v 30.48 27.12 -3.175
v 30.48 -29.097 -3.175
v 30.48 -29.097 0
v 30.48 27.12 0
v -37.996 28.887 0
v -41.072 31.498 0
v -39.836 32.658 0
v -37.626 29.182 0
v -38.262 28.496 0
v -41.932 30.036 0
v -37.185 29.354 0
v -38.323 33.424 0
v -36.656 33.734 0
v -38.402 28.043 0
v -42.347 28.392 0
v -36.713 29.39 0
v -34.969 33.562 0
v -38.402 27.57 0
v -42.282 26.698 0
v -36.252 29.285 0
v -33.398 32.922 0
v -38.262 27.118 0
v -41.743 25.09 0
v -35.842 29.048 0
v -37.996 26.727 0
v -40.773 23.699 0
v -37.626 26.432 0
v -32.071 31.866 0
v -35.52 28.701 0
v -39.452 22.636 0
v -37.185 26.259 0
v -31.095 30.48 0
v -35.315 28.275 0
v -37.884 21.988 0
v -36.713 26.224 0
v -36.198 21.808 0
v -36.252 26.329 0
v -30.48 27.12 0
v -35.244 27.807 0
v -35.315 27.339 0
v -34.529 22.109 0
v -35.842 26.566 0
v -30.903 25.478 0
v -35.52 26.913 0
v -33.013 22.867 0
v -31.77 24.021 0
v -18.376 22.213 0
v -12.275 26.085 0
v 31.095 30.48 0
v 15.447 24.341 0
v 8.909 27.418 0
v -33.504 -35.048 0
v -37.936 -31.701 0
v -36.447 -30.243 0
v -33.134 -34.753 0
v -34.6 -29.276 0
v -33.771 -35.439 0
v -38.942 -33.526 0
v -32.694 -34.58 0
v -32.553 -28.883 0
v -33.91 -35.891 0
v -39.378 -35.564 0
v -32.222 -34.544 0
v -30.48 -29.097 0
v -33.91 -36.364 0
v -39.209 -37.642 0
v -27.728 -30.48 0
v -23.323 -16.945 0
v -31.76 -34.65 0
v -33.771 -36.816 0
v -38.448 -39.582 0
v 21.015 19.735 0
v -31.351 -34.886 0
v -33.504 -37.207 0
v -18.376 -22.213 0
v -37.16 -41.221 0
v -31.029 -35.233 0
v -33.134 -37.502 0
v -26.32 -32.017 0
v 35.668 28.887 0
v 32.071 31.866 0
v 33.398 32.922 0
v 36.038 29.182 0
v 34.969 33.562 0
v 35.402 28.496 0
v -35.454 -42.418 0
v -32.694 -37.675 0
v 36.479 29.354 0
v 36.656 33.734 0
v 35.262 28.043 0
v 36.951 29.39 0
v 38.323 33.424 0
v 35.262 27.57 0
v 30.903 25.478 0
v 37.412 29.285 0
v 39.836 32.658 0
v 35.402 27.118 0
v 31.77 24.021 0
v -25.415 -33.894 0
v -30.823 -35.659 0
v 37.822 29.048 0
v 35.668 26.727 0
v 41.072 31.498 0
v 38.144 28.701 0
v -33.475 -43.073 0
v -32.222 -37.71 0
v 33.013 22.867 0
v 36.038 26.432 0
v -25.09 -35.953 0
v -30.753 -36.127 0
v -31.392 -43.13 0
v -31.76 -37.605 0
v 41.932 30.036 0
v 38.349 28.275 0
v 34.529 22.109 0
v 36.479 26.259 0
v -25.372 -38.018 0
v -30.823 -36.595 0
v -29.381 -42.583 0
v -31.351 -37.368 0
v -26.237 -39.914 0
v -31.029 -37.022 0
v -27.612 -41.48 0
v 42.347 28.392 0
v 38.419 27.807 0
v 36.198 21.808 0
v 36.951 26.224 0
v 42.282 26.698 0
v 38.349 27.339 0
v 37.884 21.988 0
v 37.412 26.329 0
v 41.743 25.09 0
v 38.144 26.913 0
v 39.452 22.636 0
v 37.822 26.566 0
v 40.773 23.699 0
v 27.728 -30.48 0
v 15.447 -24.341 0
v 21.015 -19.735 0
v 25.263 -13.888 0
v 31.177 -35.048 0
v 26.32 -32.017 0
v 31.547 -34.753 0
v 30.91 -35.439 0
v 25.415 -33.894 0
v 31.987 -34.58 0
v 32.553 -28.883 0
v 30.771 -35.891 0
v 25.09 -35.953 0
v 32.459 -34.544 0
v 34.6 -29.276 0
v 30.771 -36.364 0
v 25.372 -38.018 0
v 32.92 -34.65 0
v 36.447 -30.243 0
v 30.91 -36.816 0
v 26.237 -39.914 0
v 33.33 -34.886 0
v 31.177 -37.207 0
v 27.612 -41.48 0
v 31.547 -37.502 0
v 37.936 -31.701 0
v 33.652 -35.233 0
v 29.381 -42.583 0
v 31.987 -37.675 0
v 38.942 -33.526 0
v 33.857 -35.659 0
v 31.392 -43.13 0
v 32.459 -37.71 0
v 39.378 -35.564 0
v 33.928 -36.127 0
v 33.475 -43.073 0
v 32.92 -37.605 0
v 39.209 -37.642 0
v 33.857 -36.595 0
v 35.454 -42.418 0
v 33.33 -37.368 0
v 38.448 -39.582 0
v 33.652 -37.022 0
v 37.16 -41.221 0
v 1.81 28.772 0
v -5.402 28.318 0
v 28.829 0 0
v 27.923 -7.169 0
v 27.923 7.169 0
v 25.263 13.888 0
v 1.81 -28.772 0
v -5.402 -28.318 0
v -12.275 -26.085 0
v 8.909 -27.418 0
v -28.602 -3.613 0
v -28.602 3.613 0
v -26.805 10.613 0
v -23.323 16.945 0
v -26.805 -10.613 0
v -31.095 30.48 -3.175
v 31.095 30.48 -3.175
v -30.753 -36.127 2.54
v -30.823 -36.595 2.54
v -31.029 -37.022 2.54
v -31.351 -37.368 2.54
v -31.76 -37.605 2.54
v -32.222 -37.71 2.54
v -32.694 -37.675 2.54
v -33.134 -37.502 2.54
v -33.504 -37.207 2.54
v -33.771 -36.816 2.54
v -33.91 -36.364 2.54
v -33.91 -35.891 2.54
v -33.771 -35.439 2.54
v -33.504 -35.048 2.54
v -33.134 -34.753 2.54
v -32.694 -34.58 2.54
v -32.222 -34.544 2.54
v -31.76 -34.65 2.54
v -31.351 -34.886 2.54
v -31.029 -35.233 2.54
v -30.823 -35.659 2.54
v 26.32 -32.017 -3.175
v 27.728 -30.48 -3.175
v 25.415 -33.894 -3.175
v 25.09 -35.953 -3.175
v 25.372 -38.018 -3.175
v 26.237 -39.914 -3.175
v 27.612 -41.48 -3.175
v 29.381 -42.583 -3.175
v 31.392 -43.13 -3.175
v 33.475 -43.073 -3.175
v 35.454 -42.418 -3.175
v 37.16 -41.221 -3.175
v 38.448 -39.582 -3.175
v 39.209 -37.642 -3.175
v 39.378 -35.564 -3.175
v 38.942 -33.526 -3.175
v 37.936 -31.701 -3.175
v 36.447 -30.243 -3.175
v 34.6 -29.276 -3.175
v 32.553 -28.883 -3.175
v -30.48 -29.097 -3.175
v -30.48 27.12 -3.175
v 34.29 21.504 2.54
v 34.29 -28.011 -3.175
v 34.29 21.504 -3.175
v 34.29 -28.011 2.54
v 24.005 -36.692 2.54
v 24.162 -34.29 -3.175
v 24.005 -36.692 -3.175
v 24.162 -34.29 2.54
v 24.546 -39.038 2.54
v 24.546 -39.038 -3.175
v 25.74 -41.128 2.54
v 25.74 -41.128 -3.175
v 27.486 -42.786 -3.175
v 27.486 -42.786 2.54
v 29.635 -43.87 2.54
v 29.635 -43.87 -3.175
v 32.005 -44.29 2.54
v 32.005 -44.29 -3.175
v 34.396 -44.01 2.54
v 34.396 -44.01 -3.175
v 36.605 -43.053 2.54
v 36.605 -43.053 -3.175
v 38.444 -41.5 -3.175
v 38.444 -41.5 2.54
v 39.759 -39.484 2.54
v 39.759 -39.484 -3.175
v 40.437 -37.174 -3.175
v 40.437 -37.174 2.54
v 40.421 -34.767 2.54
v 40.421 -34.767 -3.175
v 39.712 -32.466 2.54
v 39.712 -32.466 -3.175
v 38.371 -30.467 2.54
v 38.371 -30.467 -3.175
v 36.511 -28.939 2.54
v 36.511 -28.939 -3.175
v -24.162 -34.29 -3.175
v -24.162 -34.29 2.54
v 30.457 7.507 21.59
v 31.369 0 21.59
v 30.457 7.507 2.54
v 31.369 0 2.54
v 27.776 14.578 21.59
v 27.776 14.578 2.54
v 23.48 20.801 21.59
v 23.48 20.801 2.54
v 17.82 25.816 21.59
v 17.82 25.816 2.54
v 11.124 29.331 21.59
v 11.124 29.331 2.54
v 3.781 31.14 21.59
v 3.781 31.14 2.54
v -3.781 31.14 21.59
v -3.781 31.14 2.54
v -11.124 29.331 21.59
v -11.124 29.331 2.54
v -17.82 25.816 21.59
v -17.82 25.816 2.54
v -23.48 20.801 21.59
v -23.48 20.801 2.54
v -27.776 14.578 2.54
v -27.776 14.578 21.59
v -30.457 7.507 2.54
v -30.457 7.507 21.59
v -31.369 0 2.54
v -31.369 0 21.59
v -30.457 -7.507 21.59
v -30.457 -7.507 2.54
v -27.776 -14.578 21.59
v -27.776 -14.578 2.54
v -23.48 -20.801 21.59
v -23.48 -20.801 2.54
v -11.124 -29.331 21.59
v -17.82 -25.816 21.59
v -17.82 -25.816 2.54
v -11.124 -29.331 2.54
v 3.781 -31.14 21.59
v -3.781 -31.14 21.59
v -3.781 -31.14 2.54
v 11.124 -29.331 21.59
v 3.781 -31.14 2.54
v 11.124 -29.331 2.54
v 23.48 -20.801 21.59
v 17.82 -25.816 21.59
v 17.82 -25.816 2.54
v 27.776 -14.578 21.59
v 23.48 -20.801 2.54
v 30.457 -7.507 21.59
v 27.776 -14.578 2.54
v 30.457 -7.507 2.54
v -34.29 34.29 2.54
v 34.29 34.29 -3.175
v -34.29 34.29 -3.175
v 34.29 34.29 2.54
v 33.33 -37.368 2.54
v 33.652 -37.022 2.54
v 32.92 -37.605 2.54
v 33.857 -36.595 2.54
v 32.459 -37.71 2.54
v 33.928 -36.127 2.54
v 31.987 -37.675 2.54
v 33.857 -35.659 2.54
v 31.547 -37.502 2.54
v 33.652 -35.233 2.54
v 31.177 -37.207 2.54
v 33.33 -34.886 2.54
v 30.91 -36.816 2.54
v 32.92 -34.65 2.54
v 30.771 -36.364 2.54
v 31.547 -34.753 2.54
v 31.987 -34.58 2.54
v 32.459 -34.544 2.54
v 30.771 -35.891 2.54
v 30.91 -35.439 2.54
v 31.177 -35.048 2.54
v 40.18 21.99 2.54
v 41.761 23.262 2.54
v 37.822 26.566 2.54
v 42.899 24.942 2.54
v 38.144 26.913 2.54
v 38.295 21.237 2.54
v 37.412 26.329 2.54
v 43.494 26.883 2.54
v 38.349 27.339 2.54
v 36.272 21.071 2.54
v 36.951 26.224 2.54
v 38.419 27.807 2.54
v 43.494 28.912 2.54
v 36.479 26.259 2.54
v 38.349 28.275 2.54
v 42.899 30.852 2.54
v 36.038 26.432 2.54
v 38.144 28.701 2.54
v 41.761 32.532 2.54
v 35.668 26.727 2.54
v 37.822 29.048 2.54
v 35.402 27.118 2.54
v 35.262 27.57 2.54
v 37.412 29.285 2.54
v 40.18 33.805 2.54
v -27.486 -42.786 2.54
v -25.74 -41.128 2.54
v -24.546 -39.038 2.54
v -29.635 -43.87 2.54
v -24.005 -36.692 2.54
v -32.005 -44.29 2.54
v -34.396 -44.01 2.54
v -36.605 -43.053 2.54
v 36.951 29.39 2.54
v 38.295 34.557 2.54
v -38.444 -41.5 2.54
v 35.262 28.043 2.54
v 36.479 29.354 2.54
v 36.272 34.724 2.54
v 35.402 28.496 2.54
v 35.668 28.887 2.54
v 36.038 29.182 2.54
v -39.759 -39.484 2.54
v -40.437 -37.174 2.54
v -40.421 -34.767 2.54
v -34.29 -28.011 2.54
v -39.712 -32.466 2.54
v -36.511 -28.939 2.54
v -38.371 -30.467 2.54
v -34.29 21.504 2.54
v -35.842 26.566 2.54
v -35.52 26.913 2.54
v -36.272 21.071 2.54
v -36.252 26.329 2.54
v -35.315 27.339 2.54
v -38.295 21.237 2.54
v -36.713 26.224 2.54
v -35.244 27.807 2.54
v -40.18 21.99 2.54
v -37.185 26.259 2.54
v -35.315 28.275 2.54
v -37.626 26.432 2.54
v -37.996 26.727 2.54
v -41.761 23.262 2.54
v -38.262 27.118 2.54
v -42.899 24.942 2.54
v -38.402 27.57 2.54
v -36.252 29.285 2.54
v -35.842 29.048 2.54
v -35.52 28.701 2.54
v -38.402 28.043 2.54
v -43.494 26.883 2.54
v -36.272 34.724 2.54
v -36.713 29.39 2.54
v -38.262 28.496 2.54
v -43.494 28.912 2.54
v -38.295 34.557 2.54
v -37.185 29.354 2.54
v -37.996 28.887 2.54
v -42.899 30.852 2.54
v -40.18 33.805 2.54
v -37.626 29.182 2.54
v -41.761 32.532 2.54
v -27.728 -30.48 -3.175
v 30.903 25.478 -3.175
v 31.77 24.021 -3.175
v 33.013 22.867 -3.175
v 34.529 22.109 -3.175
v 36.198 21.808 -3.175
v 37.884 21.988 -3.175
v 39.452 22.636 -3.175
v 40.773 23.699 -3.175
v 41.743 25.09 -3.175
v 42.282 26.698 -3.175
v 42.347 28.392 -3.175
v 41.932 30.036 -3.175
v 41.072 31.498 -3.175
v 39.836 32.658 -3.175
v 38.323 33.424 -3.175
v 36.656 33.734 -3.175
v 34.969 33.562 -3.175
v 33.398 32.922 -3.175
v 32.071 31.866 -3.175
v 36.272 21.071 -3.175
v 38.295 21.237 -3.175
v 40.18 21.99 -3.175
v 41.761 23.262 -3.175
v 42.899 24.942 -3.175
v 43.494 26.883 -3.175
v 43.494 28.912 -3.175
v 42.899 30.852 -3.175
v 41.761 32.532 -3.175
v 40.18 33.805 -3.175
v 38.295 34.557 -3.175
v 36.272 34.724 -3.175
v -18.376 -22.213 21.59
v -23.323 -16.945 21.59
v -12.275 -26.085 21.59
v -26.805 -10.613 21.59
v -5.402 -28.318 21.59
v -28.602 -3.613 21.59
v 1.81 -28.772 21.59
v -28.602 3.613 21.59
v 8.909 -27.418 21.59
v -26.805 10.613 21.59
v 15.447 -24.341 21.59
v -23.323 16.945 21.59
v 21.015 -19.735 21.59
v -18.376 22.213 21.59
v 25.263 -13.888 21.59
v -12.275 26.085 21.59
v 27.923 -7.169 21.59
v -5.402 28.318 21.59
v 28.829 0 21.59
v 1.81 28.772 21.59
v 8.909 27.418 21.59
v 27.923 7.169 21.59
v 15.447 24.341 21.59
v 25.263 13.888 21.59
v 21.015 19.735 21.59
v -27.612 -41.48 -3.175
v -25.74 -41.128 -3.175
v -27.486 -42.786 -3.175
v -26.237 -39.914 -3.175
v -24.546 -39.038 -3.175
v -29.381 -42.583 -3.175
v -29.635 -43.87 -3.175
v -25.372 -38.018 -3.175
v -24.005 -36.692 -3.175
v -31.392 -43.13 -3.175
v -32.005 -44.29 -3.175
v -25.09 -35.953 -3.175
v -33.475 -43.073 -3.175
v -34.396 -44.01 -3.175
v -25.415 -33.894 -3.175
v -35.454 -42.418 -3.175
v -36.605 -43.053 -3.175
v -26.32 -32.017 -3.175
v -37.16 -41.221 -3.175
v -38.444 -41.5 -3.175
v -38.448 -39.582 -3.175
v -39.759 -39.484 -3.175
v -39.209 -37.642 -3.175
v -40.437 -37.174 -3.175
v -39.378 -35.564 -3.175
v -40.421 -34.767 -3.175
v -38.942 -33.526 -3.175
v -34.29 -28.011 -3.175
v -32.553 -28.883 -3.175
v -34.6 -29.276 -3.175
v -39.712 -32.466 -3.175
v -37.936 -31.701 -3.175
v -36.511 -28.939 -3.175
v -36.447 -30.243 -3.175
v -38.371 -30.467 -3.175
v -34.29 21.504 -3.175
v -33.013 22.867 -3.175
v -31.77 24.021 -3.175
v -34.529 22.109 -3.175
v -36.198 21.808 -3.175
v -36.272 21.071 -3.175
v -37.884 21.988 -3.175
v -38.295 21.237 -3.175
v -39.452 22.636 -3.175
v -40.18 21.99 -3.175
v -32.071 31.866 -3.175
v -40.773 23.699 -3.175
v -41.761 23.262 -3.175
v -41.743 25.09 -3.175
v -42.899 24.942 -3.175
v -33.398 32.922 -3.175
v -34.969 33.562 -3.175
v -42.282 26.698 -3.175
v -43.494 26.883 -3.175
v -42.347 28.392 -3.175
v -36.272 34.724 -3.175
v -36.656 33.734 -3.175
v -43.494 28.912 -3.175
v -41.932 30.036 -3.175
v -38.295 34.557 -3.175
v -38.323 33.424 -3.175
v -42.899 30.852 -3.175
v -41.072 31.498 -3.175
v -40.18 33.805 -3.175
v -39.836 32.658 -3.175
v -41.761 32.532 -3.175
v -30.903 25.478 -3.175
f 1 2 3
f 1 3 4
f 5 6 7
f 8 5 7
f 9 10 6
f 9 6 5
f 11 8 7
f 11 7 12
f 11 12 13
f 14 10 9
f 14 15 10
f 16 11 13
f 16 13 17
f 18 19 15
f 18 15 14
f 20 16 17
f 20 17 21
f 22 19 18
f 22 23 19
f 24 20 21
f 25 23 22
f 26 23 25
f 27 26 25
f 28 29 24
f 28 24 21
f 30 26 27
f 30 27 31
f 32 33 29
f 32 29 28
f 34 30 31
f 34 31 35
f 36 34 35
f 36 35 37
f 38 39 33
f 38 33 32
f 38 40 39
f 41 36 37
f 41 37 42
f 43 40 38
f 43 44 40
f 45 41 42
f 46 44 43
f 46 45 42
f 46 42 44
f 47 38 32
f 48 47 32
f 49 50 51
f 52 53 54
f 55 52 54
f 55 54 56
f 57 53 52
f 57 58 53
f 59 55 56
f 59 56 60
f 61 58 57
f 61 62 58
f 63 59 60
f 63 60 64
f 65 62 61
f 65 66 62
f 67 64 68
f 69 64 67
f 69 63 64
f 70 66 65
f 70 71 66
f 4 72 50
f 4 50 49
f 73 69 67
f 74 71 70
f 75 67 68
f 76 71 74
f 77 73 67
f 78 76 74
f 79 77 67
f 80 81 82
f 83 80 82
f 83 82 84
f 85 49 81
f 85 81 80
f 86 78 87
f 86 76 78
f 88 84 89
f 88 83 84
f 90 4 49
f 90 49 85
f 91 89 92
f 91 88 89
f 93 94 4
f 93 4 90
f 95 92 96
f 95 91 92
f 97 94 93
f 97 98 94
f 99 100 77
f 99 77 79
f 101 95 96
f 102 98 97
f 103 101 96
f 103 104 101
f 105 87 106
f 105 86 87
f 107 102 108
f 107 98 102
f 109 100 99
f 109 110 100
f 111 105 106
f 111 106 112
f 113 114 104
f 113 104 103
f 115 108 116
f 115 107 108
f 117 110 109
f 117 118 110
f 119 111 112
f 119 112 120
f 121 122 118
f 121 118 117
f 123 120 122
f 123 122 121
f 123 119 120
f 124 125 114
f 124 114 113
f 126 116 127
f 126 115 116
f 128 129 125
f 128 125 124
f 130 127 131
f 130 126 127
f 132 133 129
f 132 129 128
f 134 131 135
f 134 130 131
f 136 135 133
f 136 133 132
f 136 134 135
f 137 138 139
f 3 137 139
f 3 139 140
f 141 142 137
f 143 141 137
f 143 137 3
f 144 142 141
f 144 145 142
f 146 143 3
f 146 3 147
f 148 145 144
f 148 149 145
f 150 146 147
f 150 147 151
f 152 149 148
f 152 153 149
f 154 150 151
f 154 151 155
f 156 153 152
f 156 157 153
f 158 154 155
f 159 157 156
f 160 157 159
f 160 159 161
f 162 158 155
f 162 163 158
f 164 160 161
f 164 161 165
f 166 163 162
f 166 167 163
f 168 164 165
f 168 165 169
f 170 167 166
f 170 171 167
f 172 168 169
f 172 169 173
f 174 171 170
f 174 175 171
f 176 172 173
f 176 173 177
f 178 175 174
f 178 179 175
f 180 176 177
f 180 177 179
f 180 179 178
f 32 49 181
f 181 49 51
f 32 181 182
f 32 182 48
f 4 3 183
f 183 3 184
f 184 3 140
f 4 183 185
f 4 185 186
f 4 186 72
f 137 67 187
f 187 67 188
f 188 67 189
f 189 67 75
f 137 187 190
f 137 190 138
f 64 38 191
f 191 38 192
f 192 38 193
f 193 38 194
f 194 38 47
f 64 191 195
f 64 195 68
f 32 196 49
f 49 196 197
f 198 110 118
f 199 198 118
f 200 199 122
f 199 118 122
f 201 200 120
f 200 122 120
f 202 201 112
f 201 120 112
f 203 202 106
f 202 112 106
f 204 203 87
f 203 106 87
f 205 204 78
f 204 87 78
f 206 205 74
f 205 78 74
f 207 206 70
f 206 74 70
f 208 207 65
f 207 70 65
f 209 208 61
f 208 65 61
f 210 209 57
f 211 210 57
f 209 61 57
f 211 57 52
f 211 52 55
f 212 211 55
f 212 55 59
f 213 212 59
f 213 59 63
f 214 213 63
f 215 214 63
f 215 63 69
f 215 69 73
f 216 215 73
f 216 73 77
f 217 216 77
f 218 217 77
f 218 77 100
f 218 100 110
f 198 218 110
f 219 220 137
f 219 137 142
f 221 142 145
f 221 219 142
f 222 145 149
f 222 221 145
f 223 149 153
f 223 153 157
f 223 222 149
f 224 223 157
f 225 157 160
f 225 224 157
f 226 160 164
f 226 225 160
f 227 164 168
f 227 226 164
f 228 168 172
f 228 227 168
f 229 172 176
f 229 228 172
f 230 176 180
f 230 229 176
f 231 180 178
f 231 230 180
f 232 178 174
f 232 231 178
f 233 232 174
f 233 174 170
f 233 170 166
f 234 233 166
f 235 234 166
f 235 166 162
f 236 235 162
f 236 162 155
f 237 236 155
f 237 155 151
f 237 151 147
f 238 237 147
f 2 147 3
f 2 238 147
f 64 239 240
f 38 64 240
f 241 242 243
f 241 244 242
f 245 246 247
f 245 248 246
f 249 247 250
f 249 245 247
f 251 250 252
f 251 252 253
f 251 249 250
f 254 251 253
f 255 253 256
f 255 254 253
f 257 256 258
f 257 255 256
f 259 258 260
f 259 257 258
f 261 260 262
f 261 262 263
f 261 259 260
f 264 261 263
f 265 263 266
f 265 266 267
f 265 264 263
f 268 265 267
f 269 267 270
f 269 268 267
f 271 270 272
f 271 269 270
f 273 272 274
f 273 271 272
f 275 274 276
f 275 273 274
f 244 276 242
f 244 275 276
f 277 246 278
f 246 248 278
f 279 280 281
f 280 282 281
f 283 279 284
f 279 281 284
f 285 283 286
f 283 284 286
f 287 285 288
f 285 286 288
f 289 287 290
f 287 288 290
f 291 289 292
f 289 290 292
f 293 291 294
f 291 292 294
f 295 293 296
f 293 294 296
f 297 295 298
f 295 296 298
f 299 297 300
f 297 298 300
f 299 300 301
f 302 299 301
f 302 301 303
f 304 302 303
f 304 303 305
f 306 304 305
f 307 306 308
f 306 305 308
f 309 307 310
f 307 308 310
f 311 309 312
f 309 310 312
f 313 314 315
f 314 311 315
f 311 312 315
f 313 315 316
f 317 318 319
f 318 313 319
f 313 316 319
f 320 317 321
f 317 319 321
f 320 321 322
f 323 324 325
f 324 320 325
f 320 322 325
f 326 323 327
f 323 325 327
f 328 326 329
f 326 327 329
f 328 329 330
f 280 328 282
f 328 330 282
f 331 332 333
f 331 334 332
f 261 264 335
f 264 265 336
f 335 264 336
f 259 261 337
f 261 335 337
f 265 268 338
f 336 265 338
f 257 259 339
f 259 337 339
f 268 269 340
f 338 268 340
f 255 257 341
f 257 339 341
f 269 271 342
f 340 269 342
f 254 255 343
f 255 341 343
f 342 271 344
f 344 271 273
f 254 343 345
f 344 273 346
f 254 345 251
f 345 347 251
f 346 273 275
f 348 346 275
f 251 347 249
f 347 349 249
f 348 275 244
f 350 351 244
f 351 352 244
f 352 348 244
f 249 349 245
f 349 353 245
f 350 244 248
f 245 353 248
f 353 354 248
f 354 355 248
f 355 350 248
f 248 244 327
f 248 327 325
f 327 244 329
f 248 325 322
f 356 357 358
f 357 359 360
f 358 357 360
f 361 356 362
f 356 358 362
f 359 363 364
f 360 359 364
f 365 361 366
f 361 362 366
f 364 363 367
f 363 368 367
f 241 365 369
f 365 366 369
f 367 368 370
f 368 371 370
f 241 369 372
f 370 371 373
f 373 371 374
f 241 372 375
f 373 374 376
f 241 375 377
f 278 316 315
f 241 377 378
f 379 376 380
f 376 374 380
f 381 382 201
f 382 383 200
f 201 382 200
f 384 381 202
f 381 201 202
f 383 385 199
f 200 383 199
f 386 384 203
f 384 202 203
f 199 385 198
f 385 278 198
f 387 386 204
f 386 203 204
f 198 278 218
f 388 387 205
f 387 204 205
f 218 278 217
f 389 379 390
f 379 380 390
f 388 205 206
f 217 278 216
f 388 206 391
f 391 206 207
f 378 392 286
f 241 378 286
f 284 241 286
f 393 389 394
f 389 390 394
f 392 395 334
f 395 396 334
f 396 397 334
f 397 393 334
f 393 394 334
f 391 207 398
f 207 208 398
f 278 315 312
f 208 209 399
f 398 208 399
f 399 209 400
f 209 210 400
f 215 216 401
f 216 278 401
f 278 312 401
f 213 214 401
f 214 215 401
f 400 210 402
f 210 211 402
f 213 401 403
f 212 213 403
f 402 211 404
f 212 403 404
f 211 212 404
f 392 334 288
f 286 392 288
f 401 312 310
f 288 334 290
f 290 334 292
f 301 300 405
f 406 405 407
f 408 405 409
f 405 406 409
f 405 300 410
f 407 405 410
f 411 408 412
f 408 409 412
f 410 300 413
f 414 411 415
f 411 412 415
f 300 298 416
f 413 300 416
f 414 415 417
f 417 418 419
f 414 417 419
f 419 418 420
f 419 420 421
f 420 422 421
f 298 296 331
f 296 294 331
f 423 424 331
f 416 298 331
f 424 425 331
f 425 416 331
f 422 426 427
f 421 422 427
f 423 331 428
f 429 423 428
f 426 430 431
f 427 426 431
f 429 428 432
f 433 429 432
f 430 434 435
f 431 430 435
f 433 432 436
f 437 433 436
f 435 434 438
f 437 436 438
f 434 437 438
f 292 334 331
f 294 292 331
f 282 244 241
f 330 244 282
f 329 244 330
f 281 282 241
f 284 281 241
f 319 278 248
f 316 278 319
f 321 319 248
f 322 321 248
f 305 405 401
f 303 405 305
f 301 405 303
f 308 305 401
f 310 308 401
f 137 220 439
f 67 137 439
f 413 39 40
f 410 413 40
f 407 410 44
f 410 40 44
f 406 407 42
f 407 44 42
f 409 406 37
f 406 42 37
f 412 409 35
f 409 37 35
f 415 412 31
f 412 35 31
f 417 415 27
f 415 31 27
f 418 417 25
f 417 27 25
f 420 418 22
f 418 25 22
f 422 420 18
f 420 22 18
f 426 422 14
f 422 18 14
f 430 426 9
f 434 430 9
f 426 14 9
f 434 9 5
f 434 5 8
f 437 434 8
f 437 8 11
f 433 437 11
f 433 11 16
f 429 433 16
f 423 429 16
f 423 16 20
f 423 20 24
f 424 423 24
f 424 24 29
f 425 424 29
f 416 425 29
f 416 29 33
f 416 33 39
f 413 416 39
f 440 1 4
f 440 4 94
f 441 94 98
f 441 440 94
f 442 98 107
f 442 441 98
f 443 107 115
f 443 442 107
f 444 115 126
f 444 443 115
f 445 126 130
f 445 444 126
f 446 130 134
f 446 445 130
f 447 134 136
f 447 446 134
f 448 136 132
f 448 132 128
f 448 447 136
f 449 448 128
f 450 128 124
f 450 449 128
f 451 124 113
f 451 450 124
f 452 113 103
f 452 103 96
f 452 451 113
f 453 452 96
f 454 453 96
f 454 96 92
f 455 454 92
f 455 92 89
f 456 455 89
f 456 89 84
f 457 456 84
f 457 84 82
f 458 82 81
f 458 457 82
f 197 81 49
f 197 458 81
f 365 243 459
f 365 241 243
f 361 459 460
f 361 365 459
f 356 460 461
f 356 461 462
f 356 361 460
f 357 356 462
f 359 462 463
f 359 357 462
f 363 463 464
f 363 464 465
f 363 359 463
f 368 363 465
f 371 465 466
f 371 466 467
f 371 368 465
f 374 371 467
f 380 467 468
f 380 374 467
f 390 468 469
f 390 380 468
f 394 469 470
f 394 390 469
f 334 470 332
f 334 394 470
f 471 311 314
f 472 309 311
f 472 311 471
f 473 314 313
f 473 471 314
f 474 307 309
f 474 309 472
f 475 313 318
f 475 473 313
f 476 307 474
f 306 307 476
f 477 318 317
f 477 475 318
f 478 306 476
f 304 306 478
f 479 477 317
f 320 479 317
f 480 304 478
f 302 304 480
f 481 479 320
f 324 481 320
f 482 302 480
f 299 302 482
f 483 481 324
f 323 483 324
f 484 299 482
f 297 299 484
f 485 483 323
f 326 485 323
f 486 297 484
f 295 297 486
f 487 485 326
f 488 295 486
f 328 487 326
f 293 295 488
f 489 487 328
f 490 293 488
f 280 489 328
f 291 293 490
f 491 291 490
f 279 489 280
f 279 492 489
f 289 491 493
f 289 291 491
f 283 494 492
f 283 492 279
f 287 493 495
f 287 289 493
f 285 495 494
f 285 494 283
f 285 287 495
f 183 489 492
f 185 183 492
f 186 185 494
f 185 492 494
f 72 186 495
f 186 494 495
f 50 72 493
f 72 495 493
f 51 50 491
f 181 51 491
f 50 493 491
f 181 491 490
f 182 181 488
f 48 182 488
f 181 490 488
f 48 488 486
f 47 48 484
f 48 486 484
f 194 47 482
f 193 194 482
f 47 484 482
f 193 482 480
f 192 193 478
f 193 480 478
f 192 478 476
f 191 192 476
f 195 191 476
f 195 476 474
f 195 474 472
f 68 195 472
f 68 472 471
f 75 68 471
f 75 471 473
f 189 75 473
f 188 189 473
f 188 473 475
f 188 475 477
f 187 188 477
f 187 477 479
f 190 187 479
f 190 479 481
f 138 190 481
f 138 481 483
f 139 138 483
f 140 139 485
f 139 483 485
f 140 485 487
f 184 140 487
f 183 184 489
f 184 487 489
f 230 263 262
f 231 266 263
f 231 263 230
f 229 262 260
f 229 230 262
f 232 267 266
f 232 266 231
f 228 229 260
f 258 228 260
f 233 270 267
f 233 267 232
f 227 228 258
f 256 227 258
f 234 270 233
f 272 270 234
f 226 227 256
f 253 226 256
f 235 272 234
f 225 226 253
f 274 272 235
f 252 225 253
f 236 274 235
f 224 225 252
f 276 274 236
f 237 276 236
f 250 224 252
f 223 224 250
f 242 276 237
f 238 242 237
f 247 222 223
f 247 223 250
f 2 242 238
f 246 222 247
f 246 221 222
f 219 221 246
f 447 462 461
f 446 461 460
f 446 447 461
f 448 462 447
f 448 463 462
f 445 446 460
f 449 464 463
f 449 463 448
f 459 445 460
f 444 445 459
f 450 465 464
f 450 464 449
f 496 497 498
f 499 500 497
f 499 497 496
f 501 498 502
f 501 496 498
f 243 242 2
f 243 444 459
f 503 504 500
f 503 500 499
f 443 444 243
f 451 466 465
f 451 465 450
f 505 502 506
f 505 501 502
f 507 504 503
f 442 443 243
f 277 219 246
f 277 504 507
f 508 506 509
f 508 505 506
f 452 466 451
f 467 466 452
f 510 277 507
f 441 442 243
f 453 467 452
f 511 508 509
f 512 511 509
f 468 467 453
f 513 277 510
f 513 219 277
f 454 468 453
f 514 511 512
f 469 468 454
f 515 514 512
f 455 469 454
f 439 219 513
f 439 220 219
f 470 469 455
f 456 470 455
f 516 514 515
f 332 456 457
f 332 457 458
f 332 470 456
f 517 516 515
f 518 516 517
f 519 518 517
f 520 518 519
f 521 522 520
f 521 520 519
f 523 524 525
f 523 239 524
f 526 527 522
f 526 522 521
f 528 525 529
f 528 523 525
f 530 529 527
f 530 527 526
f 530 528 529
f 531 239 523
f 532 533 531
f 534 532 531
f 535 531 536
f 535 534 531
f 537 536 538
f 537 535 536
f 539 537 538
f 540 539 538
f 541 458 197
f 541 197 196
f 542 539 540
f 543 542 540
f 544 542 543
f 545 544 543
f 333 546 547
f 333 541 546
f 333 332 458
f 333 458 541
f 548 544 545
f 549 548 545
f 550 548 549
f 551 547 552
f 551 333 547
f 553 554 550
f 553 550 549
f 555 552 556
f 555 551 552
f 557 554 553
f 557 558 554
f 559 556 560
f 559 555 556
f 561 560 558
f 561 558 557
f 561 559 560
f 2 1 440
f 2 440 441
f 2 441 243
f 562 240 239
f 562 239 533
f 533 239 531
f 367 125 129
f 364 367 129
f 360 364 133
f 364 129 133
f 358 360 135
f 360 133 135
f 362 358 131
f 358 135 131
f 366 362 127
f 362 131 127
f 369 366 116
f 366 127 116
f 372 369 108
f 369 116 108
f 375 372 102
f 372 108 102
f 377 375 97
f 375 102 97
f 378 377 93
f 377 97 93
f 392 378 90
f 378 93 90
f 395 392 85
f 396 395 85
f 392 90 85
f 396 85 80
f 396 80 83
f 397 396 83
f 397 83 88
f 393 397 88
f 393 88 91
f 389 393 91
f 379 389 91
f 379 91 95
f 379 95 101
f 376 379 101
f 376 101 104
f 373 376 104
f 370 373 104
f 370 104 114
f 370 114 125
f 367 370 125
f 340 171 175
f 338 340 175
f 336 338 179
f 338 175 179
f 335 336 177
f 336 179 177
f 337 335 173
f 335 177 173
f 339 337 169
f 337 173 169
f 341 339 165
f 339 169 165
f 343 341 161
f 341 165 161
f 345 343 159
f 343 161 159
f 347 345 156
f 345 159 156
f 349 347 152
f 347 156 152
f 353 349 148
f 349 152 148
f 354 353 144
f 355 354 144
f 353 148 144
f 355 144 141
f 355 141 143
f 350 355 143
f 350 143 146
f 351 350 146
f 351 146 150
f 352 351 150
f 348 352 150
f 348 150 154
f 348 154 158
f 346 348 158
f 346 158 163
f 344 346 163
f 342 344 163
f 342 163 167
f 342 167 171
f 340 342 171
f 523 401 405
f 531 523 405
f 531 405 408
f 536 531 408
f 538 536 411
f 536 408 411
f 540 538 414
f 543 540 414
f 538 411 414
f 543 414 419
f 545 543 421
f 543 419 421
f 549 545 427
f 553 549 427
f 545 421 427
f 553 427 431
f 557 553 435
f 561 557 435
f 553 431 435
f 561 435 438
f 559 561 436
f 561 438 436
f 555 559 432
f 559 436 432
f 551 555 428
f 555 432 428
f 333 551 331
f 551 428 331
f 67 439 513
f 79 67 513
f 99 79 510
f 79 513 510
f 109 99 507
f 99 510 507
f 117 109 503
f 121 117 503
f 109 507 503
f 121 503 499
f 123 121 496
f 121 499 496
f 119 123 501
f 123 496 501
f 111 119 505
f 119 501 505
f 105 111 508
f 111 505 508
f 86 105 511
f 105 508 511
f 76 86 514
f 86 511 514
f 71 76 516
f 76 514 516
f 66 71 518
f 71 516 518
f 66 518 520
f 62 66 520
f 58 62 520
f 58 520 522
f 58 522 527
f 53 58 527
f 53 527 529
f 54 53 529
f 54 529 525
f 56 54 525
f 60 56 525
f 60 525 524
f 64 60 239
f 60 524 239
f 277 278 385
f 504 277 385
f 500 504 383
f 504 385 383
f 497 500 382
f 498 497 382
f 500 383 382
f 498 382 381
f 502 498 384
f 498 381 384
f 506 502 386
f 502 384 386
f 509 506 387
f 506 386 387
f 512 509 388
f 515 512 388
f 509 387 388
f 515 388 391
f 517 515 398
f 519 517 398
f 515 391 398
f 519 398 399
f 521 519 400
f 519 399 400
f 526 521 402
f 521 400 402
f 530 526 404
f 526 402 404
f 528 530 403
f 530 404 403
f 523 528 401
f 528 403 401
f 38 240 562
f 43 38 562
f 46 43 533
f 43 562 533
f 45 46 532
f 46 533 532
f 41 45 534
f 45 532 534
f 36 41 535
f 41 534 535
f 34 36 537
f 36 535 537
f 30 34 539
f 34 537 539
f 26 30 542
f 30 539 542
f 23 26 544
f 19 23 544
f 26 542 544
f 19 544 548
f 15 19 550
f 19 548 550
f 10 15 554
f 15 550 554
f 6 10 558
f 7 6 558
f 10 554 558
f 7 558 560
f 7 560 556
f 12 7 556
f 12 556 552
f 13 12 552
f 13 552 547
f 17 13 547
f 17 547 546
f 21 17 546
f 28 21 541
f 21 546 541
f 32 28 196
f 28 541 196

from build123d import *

# Parameters (mm, degrees)
F0_W      = 31.75
F0_H      = 31.75
F1_DEPTH  = 2.54
F2_R      = 28.829
F3_DEPTH  = 25.4
F4_DEPTH  = 2.54
F5_DEPTH  = 2.54
F6_DEPTH  = 2.54
F7_DEPTH  = 2.54
F8_R      = 31.369
F8_R_2    = 28.829
F9_DEPTH  = 19.05
F12_DEPTH = 2.54
F15_DEPTH = 2.54
F17_DEPTH = 3.175
F19_DEPTH = 3.175
F20_R     = 1.5875
F21_DEPTH = 25.4


# Not quite as in the source:
# - a pattern or mirror of a feature is missing from the dataset's text; its kind, count and spacing are read off the source's solid


with BuildPart() as f1:
    # F0 (on Top) → F1 (new body)
    with BuildSketch(Plane.XY):
        with Locations((-15.875, 15.875)):
            Rectangle(F0_W, F0_H)
        with Locations((15.875, -15.875)):
            Rectangle(F0_W, F0_H)
        with Locations((15.875, 15.875)):
            Rectangle(F0_W, F0_H)
        with Locations((-15.875, -15.875)):
            Rectangle(F0_W, F0_H)
    extrude(amount=F1_DEPTH)

    # F2 (on face) → F3 (cut)
    with BuildSketch(Plane.XY.offset(2.54)):
        Circle(F2_R)
    extrude(amount=-F3_DEPTH, mode=Mode.SUBTRACT)

    # F4 (add): a face of the model
    f4_faces = [f1.faces().sort_by_distance(p)[0] for p in [
        (0, -31.75, 1.27),
    ]]
    extrude(f4_faces, amount=F4_DEPTH)

    # F5 (add): a face of the model
    f5_faces = [f1.faces().sort_by_distance(p)[0] for p in [
        (0, 31.75, 1.27),
    ]]
    extrude(f5_faces, amount=F5_DEPTH)

    # F6 (add): a face of the model
    f6_faces = [f1.faces().sort_by_distance(p)[0] for p in [
        (31.75, 0, 1.27),
    ]]
    extrude(f6_faces, amount=F6_DEPTH)

    # F7 (add): a face of the model
    f7_faces = [f1.faces().sort_by_distance(p)[0] for p in [
        (-31.75, 0, 1.27),
    ]]
    extrude(f7_faces, amount=F7_DEPTH)

    # F8 (on face) → F9 (join)
    with BuildSketch(Plane.XY.offset(2.54)):
        Circle(F8_R)
        Circle(F8_R_2, mode=Mode.SUBTRACT)
    extrude(amount=F9_DEPTH)

    # F11 (on face) → F12 (join)
    with BuildSketch(Plane.XY.offset(2.54)):
        with BuildLine():
            Line((34.29, -34.29), (24.1616647691, -34.29))
            ThreePointArc((24.1616647691, -34.29), (36.604718933, -43.052889693), (34.29, -28.0109513551))
            Line((34.29, -28.0109513551), (34.29, -34.29))
        make_face()
    extrude(amount=-F12_DEPTH)

    # F13: F1 across plane


with BuildPart() as f1_1:
    add(f1.part)
    add(f1.part.mirror(Plane(origin=(0, 0, 1.27), x_dir=(0, -1, 0), z_dir=(-1, 0, 0))))

    # F14 (on face) → F15 (join)
    with BuildSketch(Plane.XY.offset(2.54)):
        with BuildLine():
            Line((34.29, 34.29), (34.29, 21.5044934303))
            ThreePointArc((34.29, 21.5044934303), (43.5698705735, 27.8972467151), (34.29, 34.29))
        make_face()
    extrude(amount=-F15_DEPTH)

    # F16: F1 across plane


with BuildPart() as f1_2:
    add(f1_1.part)
    add(f1_1.part.mirror(Plane(origin=(0, 0, 1.27), x_dir=(0, -1, 0), z_dir=(-1, 0, 0))))

    # F17 (add): a face of the model
    f17_faces = [f1_2.faces().sort_by_distance(p)[0] for p in [
        (0, -33.113583232, 0),
    ]]
    extrude(f17_faces, amount=F17_DEPTH)

    # F18 (on face) → F19 (cut)
    with BuildSketch(Plane(origin=(0, 0, -3.175), x_dir=(1, 0, 0), z_dir=(0, 0, -1))):
        with BuildLine():
            Line((0, 30.48), (-27.7283061296, 30.48))
            ThreePointArc((-27.7283061296, 30.48), (-35.4541518447, 42.4181121108), (-30.48, 29.0965121239))
            Line((-30.48, 29.0965121239), (-30.48, 3.2532289624))
            Line((-30.48, 3.2532289624), (-30.48, -27.1199196577))
            ThreePointArc((-30.48, -27.1199196577), (-42.2816797053, -26.6976345281), (-31.094558537, -30.48))
            Line((-31.094558537, -30.48), (0, -30.48))
            Line((0, -30.48), (0, 30.48))
        make_face()
    f19 = extrude(amount=-F19_DEPTH, mode=Mode.SUBTRACT)

    # F19_copies: F19 across plane
    add(f19.mirror(Plane(origin=(0, 0, 0), x_dir=(0, 0, 1), z_dir=(1, 0, 0))), mode=Mode.SUBTRACT)

    # F20 (on face) → F21 (cut)
    with BuildSketch(Plane(origin=(0, 0, 0), x_dir=(1, 0, 0), z_dir=(0, 0, -1))):
        with Locations((-32.3404680081, 36.1273235781)):
            Circle(F20_R)
        with Locations((32.3404680081, 36.1273235781)):
            Circle(F20_R)
        with Locations((36.8319889795, -27.8067924424)):
            Circle(F20_R)
        with Locations((-36.8319889795, -27.8067924424)):
            Circle(F20_R)
    extrude(amount=-F21_DEPTH, mode=Mode.SUBTRACT)


solid = f1_2.part
